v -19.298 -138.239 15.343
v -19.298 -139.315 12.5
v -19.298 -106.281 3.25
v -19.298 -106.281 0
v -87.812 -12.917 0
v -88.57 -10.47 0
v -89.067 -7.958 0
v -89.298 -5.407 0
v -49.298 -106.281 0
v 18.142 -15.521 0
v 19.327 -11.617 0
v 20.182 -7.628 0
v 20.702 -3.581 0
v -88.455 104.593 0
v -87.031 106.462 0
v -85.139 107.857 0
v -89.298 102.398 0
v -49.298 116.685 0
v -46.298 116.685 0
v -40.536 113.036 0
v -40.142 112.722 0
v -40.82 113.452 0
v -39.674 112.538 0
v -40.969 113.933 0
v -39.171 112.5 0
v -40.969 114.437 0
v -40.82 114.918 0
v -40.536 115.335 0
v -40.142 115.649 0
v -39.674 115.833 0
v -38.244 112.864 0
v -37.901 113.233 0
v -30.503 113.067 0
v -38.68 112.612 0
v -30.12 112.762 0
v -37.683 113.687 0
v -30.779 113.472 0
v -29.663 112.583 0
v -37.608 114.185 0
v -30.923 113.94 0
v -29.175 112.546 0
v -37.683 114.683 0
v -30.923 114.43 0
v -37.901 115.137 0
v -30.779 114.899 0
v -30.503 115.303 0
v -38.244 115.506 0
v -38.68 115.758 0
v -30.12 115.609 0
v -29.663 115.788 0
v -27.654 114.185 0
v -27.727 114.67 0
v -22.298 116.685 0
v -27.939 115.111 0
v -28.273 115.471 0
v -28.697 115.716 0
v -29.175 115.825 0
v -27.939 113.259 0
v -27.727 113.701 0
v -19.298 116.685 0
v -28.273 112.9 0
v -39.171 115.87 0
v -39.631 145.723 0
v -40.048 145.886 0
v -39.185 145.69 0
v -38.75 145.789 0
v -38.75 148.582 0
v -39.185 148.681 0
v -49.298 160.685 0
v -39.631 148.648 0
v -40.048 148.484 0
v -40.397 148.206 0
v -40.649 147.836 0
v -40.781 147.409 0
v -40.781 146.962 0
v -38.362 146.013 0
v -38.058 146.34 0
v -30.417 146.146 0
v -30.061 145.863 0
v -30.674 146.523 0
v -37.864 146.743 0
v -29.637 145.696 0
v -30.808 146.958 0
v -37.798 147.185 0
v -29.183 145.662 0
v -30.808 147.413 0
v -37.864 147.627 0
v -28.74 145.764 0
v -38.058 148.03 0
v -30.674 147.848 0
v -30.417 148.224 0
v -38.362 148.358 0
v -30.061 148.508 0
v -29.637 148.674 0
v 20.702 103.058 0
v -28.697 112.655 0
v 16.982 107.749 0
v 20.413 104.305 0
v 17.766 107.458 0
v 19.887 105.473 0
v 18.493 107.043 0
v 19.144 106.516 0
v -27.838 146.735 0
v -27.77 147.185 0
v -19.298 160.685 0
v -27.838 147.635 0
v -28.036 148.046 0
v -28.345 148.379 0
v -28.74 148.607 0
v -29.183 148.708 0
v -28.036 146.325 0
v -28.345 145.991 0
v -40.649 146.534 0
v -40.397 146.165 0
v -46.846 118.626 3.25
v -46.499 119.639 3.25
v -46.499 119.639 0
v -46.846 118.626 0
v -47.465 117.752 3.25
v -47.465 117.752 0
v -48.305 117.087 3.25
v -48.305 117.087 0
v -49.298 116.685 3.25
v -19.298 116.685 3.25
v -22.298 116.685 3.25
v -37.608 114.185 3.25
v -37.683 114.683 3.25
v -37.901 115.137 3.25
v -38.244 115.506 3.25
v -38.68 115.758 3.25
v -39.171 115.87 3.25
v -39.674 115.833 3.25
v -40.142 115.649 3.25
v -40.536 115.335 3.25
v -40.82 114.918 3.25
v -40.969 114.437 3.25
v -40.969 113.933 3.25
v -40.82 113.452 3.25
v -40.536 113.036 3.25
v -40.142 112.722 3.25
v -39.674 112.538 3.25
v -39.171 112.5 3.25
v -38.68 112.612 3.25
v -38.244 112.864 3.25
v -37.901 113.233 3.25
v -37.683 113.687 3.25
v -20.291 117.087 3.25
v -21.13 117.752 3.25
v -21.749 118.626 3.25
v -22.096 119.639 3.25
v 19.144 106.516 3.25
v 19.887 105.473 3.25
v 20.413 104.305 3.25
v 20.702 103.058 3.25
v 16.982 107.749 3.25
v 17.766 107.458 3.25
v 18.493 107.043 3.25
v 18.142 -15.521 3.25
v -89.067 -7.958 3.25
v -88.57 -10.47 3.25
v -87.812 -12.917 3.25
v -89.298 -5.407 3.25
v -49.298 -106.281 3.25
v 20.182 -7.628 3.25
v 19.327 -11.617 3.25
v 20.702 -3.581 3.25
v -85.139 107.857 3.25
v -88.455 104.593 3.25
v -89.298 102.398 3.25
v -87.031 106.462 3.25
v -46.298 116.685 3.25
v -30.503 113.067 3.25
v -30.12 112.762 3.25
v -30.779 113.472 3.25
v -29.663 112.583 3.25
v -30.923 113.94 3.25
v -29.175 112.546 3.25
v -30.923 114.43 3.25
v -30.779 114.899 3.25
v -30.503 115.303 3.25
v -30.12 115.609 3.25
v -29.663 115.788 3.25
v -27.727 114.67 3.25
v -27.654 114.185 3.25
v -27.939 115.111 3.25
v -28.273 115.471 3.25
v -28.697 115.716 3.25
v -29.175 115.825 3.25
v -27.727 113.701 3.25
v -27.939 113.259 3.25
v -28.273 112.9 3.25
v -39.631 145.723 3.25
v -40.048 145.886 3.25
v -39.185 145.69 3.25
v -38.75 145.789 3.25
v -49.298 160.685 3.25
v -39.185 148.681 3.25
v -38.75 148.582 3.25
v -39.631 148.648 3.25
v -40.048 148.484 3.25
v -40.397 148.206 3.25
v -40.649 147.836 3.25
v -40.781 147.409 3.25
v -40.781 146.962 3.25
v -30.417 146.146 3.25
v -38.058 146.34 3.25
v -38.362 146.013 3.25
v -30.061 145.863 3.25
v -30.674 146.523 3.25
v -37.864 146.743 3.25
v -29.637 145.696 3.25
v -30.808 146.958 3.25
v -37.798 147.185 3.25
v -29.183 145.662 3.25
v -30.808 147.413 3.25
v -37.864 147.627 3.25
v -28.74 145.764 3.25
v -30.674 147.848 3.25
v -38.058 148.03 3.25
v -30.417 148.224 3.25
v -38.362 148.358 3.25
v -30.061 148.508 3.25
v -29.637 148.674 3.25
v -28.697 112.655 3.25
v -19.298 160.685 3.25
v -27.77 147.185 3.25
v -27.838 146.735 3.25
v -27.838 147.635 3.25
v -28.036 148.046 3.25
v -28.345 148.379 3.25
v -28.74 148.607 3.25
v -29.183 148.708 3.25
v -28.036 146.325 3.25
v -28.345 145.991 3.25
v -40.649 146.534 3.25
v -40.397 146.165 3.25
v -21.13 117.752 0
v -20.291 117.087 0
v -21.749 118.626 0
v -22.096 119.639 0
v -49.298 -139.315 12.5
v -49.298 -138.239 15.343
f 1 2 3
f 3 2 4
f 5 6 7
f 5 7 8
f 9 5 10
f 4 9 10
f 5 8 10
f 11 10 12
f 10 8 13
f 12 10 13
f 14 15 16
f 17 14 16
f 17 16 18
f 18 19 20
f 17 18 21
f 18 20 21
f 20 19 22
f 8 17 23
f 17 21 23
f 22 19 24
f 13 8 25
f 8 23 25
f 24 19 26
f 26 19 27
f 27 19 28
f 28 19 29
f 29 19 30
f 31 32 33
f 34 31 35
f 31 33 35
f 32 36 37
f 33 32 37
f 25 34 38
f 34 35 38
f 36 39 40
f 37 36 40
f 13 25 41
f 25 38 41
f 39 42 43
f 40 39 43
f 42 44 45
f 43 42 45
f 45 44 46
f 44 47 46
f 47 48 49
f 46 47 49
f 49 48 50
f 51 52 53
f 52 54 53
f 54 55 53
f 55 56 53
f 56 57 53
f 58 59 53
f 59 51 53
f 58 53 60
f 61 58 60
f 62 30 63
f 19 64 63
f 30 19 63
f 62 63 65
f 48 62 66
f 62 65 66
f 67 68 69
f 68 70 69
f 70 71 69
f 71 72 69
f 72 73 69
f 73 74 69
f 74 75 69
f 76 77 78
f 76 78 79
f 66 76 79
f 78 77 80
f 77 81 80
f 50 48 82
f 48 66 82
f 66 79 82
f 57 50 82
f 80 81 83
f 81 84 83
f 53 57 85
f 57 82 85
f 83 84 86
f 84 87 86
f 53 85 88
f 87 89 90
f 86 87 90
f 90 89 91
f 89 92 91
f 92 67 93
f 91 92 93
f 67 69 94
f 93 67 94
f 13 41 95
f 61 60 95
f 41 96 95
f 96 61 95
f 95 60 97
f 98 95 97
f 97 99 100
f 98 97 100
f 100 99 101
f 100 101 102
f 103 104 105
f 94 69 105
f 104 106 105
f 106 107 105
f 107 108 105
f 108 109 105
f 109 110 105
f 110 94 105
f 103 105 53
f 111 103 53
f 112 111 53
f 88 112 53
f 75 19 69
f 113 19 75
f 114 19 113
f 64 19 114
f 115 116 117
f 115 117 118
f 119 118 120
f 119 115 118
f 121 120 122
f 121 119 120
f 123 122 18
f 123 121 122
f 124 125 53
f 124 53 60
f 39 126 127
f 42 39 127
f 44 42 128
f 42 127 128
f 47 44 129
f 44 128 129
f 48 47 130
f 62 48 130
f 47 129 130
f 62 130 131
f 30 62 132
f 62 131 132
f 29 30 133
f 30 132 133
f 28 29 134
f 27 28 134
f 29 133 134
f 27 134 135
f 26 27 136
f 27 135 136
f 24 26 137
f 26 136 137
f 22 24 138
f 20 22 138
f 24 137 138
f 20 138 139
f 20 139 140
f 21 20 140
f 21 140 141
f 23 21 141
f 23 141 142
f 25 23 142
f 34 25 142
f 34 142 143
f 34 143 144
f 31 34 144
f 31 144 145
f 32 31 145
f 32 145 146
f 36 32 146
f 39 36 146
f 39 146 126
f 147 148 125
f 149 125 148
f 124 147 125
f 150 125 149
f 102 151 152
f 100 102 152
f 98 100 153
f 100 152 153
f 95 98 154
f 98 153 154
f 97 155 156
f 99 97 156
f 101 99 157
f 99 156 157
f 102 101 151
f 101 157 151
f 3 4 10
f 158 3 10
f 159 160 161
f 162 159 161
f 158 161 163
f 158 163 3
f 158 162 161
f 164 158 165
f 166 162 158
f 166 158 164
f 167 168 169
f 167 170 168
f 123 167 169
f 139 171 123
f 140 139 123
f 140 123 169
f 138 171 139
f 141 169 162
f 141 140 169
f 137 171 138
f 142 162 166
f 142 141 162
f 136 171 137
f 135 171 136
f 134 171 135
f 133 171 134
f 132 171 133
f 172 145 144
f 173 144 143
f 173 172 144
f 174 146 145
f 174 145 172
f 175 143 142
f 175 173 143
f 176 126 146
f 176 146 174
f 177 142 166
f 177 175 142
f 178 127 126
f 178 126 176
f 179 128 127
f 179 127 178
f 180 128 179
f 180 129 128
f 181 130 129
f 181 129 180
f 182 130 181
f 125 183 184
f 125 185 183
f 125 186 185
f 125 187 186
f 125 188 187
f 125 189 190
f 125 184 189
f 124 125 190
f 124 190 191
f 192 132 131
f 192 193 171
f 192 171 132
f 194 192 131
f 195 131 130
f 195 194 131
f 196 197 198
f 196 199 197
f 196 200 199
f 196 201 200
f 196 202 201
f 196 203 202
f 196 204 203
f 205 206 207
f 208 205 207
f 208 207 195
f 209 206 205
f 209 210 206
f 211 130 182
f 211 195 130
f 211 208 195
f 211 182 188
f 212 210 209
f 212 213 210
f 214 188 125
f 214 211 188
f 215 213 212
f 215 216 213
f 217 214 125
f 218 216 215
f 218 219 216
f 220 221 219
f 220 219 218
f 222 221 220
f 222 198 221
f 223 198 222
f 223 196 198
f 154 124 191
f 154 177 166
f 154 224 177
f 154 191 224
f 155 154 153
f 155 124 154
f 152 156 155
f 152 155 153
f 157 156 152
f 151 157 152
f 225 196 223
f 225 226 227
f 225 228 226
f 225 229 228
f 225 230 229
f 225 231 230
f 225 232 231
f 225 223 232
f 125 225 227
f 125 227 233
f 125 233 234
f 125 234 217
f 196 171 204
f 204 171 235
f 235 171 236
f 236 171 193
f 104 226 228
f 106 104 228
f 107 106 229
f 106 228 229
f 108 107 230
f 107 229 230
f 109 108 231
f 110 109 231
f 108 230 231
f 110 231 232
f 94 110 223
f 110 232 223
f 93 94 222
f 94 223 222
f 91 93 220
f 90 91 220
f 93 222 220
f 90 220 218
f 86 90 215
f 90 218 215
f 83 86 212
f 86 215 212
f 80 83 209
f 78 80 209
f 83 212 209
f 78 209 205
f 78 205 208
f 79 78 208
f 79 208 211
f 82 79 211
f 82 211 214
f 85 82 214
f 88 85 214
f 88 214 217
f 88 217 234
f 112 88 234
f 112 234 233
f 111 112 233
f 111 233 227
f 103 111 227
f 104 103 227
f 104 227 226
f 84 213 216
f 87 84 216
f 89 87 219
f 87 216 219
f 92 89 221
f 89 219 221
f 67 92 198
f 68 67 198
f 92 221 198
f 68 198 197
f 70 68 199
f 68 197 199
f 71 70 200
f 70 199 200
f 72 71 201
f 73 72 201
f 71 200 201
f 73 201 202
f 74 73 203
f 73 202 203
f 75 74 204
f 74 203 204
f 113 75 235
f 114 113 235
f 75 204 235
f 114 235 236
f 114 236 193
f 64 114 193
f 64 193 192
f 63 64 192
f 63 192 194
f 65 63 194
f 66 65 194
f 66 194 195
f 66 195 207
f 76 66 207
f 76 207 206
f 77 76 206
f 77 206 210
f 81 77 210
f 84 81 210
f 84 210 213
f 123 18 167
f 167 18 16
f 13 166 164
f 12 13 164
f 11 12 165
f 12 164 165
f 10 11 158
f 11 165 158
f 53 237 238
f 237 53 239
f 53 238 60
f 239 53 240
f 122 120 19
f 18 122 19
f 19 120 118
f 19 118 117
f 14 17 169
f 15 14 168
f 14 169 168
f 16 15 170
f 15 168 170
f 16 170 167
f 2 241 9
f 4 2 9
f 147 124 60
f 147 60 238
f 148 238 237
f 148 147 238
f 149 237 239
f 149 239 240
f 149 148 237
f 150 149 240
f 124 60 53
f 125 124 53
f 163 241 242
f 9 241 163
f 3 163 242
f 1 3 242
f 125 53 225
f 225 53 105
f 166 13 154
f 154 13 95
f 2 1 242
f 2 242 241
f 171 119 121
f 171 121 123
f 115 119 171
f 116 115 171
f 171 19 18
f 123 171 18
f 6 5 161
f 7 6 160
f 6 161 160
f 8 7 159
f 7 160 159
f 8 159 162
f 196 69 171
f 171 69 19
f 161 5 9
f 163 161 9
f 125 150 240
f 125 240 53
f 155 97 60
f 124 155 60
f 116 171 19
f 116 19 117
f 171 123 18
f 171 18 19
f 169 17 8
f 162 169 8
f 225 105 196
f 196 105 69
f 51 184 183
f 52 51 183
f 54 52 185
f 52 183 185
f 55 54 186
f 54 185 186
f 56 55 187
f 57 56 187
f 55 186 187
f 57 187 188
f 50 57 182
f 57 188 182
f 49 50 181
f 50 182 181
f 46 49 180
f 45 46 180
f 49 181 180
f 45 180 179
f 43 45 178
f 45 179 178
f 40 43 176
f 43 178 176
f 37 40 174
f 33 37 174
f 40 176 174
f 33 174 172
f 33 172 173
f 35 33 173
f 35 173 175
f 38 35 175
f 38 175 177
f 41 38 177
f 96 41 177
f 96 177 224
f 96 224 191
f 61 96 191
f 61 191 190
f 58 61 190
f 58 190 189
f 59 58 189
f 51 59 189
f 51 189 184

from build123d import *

# Parameters (mm, degrees)
F0_W      = 30
F0_H      = 33.0341812223
F1_DEPTH  = 3.25
F2_DEPTH  = 25
F4_DEPTH  = 70
F6_DEPTH  = 25
F8_DEPTH  = 25
F10_DEPTH = 25
F12_DEPTH = 3.25
F13_R     = 1.5272923045
F13_R_2   = 1.5
F13_R_3   = 1.6897959648
F13_R_4   = 1.6439369158
F14_DEPTH = 25


with BuildPart() as f1:
    # F0 (on Top) → F1 (new body)
    with BuildSketch(Plane.XY):
        Polygon((-19.2975898087, 160.6853131205), (-49.2975898087, 160.6853131205), (-46.2975898087, 116.6853131205), (-22.2975898087, 116.6853131205), align=None)
        Polygon((-22.2975898087, 116.6853131205), (-46.2975898087, 116.6853131205), (-49.2975898087, 116.6853131205), (-89.2975898087, 106.8327352405), (-89.2975898087, -9.3146868795), (-49.2975898087, -106.2805056572), (-19.2975898087, -106.2805056572), (20.7024101913, -9.3146868795), (20.7024101913, 106.8327352405), (-19.2975898087, 116.6853131205), align=None)
        with Locations((-34.2975898087, -122.7975962684)):
            Rectangle(F0_W, F0_H)
    extrude(amount=F1_DEPTH)

    # F0 (on Top) → F2 (join)
    with BuildSketch(Plane.XY):
        with Locations((-34.2975898087, -122.7975962684)):
            Rectangle(F0_W, F0_H)
    extrude(amount=F2_DEPTH)

    # F3 (on face) → F4 (cut)
    with BuildSketch(Plane(origin=(-49.2975898087, 0, 0), x_dir=(0, -1, 0), z_dir=(-1, 0, 0))):
        Polygon((106.2805056572, 25), (106.2805056572, 3.25), (138.2389306125, 15.342938198), (139.3146868795, 12.5), (139.3146868795, 25), align=None)
        Polygon((139.3146868795, 12.5), (106.2805056572, 0), (139.3146868795, 0), align=None)
    extrude(amount=-F4_DEPTH, mode=Mode.SUBTRACT)

    # F5 (on face) → F6 (cut)
    with BuildSketch(Plane.XY.offset(3.25)):
        with BuildLine():
            ThreePointArc((20.7024101913, -3.5812088754), (19.7957036809, -9.631032192), (18.1423073419, -15.5207486031))
            Line((18.1423073419, -15.5207486031), (20.7024101913, -9.3146868795))
            Line((20.7024101913, -9.3146868795), (20.7024101913, -3.5812088754))
        make_face()
        with BuildLine():
            ThreePointArc((-87.8115793592, -12.9169923783), (-88.8515785257, -9.2205689181), (-89.2975898087, -5.4066183942))
            Line((-89.2975898087, -5.4066183942), (-89.2975898087, -9.3146868795))
            Line((-89.2975898087, -9.3146868795), (-87.8115793592, -12.9169923783))
        make_face()
    extrude(amount=-F6_DEPTH, mode=Mode.SUBTRACT)

    # F7 (on face) → F8 (cut)
    with BuildSketch(Plane.XY.offset(3.25)):
        with BuildLine():
            Line((-89.2975898087, 106.8327352405), (-89.2975898087, 102.3979485035))
            ThreePointArc((-89.2975898087, 102.3979485035), (-87.8097691882, 105.5783050654), (-85.1386033392, 107.8571536928))
            Line((-85.1386033392, 107.8571536928), (-89.2975898087, 106.8327352405))
        make_face()
        with BuildLine():
            ThreePointArc((18.1156906615, 107.469881631), (19.8559858763, 105.5257173252), (20.7024101913, 103.057526052))
            Line((20.7024101913, 103.057526052), (20.7024101913, 106.8327352405))
            Line((20.7024101913, 106.8327352405), (18.1156906615, 107.469881631))
        make_face()
    extrude(amount=-F8_DEPTH, mode=Mode.SUBTRACT)

    # F9 (on face) → F10 (cut)
    with BuildSketch(Plane.XY.offset(3.25)):
        with BuildLine():
            ThreePointArc((16.9817362441, 107.7491909862), (18.1382259627, 107.2650581653), (19.1438997646, 106.5164105434))
            ThreePointArc((19.1438997646, 106.5164105434), (18.6553024951, 107.0206527624), (18.1156906615, 107.469881631))
            Line((18.1156906615, 107.469881631), (16.9817362441, 107.7491909862))
        make_face()
    extrude(amount=-F10_DEPTH, mode=Mode.SUBTRACT)

    # F13 (on face) → F14 (cut)
    with BuildSketch(Plane.XY.offset(3.25)):
        with Locations((-29.2975898087, 147.1853131205)):
            Circle(F13_R)
        with Locations((-39.2975898087, 147.1853131205)):
            Circle(F13_R_2)
        with Locations((-39.2975898087, 114.1853131205)):
            Circle(F13_R_3)
        with Locations((-29.2975898087, 114.1853131205)):
            Circle(F13_R_4)
    extrude(amount=-F14_DEPTH, mode=Mode.SUBTRACT)


with BuildPart() as f12:
    # F11 (on face) → F12 (new body)
    with BuildSketch(Plane.XY.offset(3.25)):
        with BuildLine():
            ThreePointArc((-46.4989761162, 119.6389789632), (-47.464933648, 117.7515453207), (-49.2975898087, 116.6853131205))
            Line((-49.2975898087, 116.6853131205), (-46.2975898087, 116.6853131205))
            Line((-46.2975898087, 116.6853131205), (-46.4989761162, 119.6389789632))
        make_face()
    extrude(amount=-F12_DEPTH)


with BuildPart() as f12b:
    # F11 (on face) → F12, piece 2 (new body)
    with BuildSketch(Plane.XY.offset(3.25)):
        with BuildLine():
            ThreePointArc((-19.2975898087, 116.6853131205), (-21.1302459694, 117.7515453207), (-22.0962035012, 119.6389789632))
            Line((-22.0962035012, 119.6389789632), (-22.2975898087, 116.6853131205))
            Line((-22.2975898087, 116.6853131205), (-19.2975898087, 116.6853131205))
        make_face()
    extrude(amount=-F12_DEPTH)


solid = Compound([f1.part, f12.part, f12b.part])
